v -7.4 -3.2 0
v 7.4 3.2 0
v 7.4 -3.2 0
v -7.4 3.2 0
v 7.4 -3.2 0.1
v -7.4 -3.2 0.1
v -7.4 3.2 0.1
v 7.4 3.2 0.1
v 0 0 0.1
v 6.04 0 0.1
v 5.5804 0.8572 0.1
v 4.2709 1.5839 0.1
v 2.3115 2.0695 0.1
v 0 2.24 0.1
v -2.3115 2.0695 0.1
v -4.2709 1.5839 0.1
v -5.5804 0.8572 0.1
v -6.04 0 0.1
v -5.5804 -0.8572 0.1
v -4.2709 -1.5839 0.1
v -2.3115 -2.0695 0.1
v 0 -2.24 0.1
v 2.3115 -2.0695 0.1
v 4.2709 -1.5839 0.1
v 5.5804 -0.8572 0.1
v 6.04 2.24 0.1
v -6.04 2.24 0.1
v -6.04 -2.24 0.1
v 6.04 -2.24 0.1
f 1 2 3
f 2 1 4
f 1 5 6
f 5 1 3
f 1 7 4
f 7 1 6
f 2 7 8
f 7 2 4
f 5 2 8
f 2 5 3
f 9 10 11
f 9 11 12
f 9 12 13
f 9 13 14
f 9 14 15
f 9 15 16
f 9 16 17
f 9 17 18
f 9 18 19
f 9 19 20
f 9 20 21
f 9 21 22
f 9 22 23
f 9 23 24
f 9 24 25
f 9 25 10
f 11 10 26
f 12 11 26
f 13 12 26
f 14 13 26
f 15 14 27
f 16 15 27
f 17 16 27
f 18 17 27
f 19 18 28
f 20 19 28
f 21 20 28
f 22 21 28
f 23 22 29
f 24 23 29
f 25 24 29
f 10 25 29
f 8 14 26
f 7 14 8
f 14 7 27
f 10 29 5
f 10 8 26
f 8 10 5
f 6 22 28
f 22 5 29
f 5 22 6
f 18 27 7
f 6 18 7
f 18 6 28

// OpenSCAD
// file: ../p/box5-12.scad
use <../lib.scad>
function ldraw_lib__box5_12() = [
// 0 Box with 5 Faces without Any Edges
// 0 Name: box5-12.dat
// 0 Author: Chris Dee [cwdee]
// 0 !LDRAW_ORG Primitive UPDATE 2009-02
// 0 !LICENSE Licensed under CC BY 2.0 and CC BY 4.0 : see CAreadme.txt
// 
// 0 BFC CERTIFY CCW
  [0,"BFC","CERTIFY"],
  [0,"BFC","CCW"],
// 
// 0 !HISTORY 2009-09-03 [PTadmin] Official Update 2009-02
// 
// 
// 4 16 1 1 1 1 1 -1 -1 1 -1 -1 1 1
  [4,16,1,1,1,1,1,-1,-1,1,-1,-1,1,1],
// 4 16 -1 0 1 1 0 1 1 1 1 -1 1 1
  [4,16,-1,0,1,1,0,1,1,1,1,-1,1,1],
// 4 16 -1 0 -1 -1 0 1 -1 1 1 -1 1 -1
  [4,16,-1,0,-1,-1,0,1,-1,1,1,-1,1,-1],
// 4 16 1 0 -1 -1 0 -1 -1 1 -1 1 1 -1
  [4,16,1,0,-1,-1,0,-1,-1,1,-1,1,1,-1],
// 4 16 1 0 1 1 0 -1 1 1 -1 1 1 1
  [4,16,1,0,1,1,0,-1,1,1,-1,1,1,1],
// 0
];
makepoly(ldraw_lib__box5_12(), line=0.2);
// file: ../p/4-4ndis.scad
use <../lib.scad>
function ldraw_lib__4_4ndis() = [
// 0 Disc Negative 1.0
// 0 Name: 4-4ndis.dat
// 0 Author: James Jessiman
// 0 !LDRAW_ORG Primitive UPDATE 2012-01
// 0 !LICENSE Licensed under CC BY 2.0 and CC BY 4.0 : see CAreadme.txt
// 
// 0 BFC CERTIFY CCW
  [0,"BFC","CERTIFY"],
  [0,"BFC","CCW"],
// 
// 0 !HISTORY 2002-03-23 [sbliss] Added BFC statement; compacted code
// 0 !HISTORY 2002-04-25 [PTadmin] Official Update 2002-02
// 0 !HISTORY 2007-06-24 [PTadmin] Header formatted for Contributor Agreement
// 0 !HISTORY 2008-07-01 [PTadmin] Official Update 2008-01
// 0 !HISTORY 2012-02-16 [Philo] Changed to CCW
// 0 !HISTORY 2012-03-30 [PTadmin] Official Update 2012-01
// 
// 
// 3 16 0.9239 0 0.3827 1 0 0 1 0 1
  [3,16,0.9239,0,0.3827,1,0,0,1,0,1],
// 3 16 0.7071 0 0.7071 0.9239 0 0.3827 1 0 1
  [3,16,0.7071,0,0.7071,0.9239,0,0.3827,1,0,1],
// 3 16 0.3827 0 0.9239 0.7071 0 0.7071 1 0 1
  [3,16,0.3827,0,0.9239,0.7071,0,0.7071,1,0,1],
// 3 16 0 0 1 0.3827 0 0.9239 1 0 1
  [3,16,0,0,1,0.3827,0,0.9239,1,0,1],
// 3 16 -0.3827 0 0.9239 0 0 1 -1 0 1
  [3,16,-0.3827,0,0.9239,0,0,1,-1,0,1],
// 3 16 -0.7071 0 0.7071 -0.3827 0 0.9239 -1 0 1
  [3,16,-0.7071,0,0.7071,-0.3827,0,0.9239,-1,0,1],
// 3 16 -0.9239 0 0.3827 -0.7071 0 0.7071 -1 0 1
  [3,16,-0.9239,0,0.3827,-0.7071,0,0.7071,-1,0,1],
// 3 16 -1 0 0 -0.9239 0 0.3827 -1 0 1
  [3,16,-1,0,0,-0.9239,0,0.3827,-1,0,1],
// 3 16 -0.9239 0 -0.3827 -1 0 0 -1 0 -1
  [3,16,-0.9239,0,-0.3827,-1,0,0,-1,0,-1],
// 3 16 -0.7071 0 -0.7071 -0.9239 0 -0.3827 -1 0 -1
  [3,16,-0.7071,0,-0.7071,-0.9239,0,-0.3827,-1,0,-1],
// 3 16 -0.3827 0 -0.9239 -0.7071 0 -0.7071 -1 0 -1
  [3,16,-0.3827,0,-0.9239,-0.7071,0,-0.7071,-1,0,-1],
// 3 16 0 0 -1 -0.3827 0 -0.9239 -1 0 -1
  [3,16,0,0,-1,-0.3827,0,-0.9239,-1,0,-1],
// 3 16 0.3827 0 -0.9239 0 0 -1 1 0 -1
  [3,16,0.3827,0,-0.9239,0,0,-1,1,0,-1],
// 3 16 0.7071 0 -0.7071 0.3827 0 -0.9239 1 0 -1
  [3,16,0.7071,0,-0.7071,0.3827,0,-0.9239,1,0,-1],
// 3 16 0.9239 0 -0.3827 0.7071 0 -0.7071 1 0 -1
  [3,16,0.9239,0,-0.3827,0.7071,0,-0.7071,1,0,-1],
// 3 16 1 0 0 0.9239 0 -0.3827 1 0 -1
  [3,16,1,0,0,0.9239,0,-0.3827,1,0,-1],
];
makepoly(ldraw_lib__4_4ndis(), line=0.2);
// file: ../p/4-4disc.scad
use <../lib.scad>
function ldraw_lib__4_4disc() = [
// 0 Disc 1.0
// 0 Name: 4-4disc.dat
// 0 Author: James Jessiman
// 0 !LDRAW_ORG Primitive UPDATE 2002-02
// 0 !LICENSE Licensed under CC BY 2.0 and CC BY 4.0 : see CAreadme.txt
// 
// 0 BFC CERTIFY CCW
  [0,"BFC","CERTIFY"],
  [0,"BFC","CCW"],
// 
// 0 !HISTORY 1998-12-15 [PTadmin] Official Update 1998-10
// 0 !HISTORY 2002-03-23 [sbliss] Added BFC statement
// 0 !HISTORY 2002-04-25 [PTadmin] Official Update 2002-02
// 0 !HISTORY 2007-06-24 [PTadmin] Header formatted for Contributor Agreement
// 0 !HISTORY 2008-07-01 [PTadmin] Official Update 2008-01
// 
// 
// 3 16 0 0 0 1 0 0 0.9239 0 0.3827
  [3,16,0,0,0,1,0,0,0.9239,0,0.3827],
// 3 16 0 0 0 0.9239 0 0.3827 0.7071 0 0.7071
  [3,16,0,0,0,0.9239,0,0.3827,0.7071,0,0.7071],
// 3 16 0 0 0 0.7071 0 0.7071 0.3827 0 0.9239
  [3,16,0,0,0,0.7071,0,0.7071,0.3827,0,0.9239],
// 3 16 0 0 0 0.3827 0 0.9239 0 0 1
  [3,16,0,0,0,0.3827,0,0.9239,0,0,1],
// 3 16 0 0 0 0 0 1 -0.3827 0 0.9239
  [3,16,0,0,0,0,0,1,-0.3827,0,0.9239],
// 3 16 0 0 0 -0.3827 0 0.9239 -0.7071 0 0.7071
  [3,16,0,0,0,-0.3827,0,0.9239,-0.7071,0,0.7071],
// 3 16 0 0 0 -0.7071 0 0.7071 -0.9239 0 0.3827
  [3,16,0,0,0,-0.7071,0,0.7071,-0.9239,0,0.3827],
// 3 16 0 0 0 -0.9239 0 0.3827 -1 0 -0
  [3,16,0,0,0,-0.9239,0,0.3827,-1,0,-0],
// 3 16 0 0 0 -1 0 -0 -0.9239 0 -0.3827
  [3,16,0,0,0,-1,0,-0,-0.9239,0,-0.3827],
// 3 16 0 0 0 -0.9239 0 -0.3827 -0.7071 0 -0.7071
  [3,16,0,0,0,-0.9239,0,-0.3827,-0.7071,0,-0.7071],
// 3 16 0 0 0 -0.7071 0 -0.7071 -0.3827 0 -0.9239
  [3,16,0,0,0,-0.7071,0,-0.7071,-0.3827,0,-0.9239],
// 3 16 0 0 0 -0.3827 0 -0.9239 0 0 -1
  [3,16,0,0,0,-0.3827,0,-0.9239,0,0,-1],
// 3 16 0 0 0 0 0 -1 0.3827 0 -0.9239
  [3,16,0,0,0,0,0,-1,0.3827,0,-0.9239],
// 3 16 0 0 0 0.3827 0 -0.9239 0.7071 0 -0.7071
  [3,16,0,0,0,0.3827,0,-0.9239,0.7071,0,-0.7071],
// 3 16 0 0 0 0.7071 0 -0.7071 0.9239 0 -0.3827
  [3,16,0,0,0,0.7071,0,-0.7071,0.9239,0,-0.3827],
// 3 16 0 0 0 0.9239 0 -0.3827 1 0 0
  [3,16,0,0,0,0.9239,0,-0.3827,1,0,0],
// 0
];
makepoly(ldraw_lib__4_4disc(), line=0.2);
// main file
use <../lib.scad>
use <../p/4-4disc.scad>
use <../p/4-4ndis.scad>
use <../p/box5-12.scad>
function ldraw_lib__821420a() = [
// 0 Sticker  0.8 x  1.85 with Black Oval
// 0 Name: 821420a.dat
// 0 Author: Max Martin Richter [MMR1988]
// 0 !LDRAW_ORG Part UPDATE 2013-02
// 0 !LICENSE Licensed under CC BY 2.0 and CC BY 4.0 : see CAreadme.txt
// 
// 0 BFC CERTIFY CCW
  [0,"BFC","CERTIFY"],
  [0,"BFC","CCW"],
// 
// 0 !KEYWORDS basin, set 10002, set 4547, sink
// 
// 0 !HISTORY 2013-12-23 [PTadmin] Official Update 2013-02
// 
// 
// 1 16 0 -0.25 0 18.5 0 0 0 0.25 0 0 0 -8 box5-12.dat
  [1,16,0,-0.25,0,18.5,0,0,0,0.25,0,0,0,-8, ldraw_lib__box5_12()],
// 
// 1 0 0 -0.25 0 15.1 0 0 0 1 0 0 0 5.6 4-4disc.dat
  [1,0,0,-0.25,0,15.1,0,0,0,1,0,0,0,5.6, ldraw_lib__4_4disc()],
// 1 16 0 -0.25 0 15.1 0 0 0 1 0 0 0 5.6 4-4ndis.dat
  [1,16,0,-0.25,0,15.1,0,0,0,1,0,0,0,5.6, ldraw_lib__4_4ndis()],
// 
// 3 16 18.5 -0.25 8 0 -0.25 5.6 15.1 -0.25 5.6
  [3,16,18.5,-0.25,8,0,-0.25,5.6,15.1,-0.25,5.6],
// 4 16 18.5 -0.25 8 -18.5 -0.25 8 -15.1 -0.25 5.6 0 -0.25 5.6
  [4,16,18.5,-0.25,8,-18.5,-0.25,8,-15.1,-0.25,5.6,0,-0.25,5.6],
// 3 16 15.1 -0.25 0 15.1 -0.25 -5.6 18.5 -0.25 -8
  [3,16,15.1,-0.25,0,15.1,-0.25,-5.6,18.5,-0.25,-8],
// 4 16 15.1 -0.25 5.6 15.1 -0.25 0 18.5 -0.25 -8 18.5 -0.25 8
  [4,16,15.1,-0.25,5.6,15.1,-0.25,0,18.5,-0.25,-8,18.5,-0.25,8],
// 3 16 -18.5 -0.25 -8 0 -0.25 -5.6 -15.1 -0.25 -5.6
  [3,16,-18.5,-0.25,-8,0,-0.25,-5.6,-15.1,-0.25,-5.6],
// 4 16 -18.5 -0.25 -8 18.5 -0.25 -8 15.1 -0.25 -5.6 0 -0.25 -5.6
  [4,16,-18.5,-0.25,-8,18.5,-0.25,-8,15.1,-0.25,-5.6,0,-0.25,-5.6],
// 3 16 -15.1 -0.25 0 -15.1 -0.25 5.6 -18.5 -0.25 8
  [3,16,-15.1,-0.25,0,-15.1,-0.25,5.6,-18.5,-0.25,8],
// 4 16 -15.1 -0.25 -5.6 -15.1 -0.25 0 -18.5 -0.25 8 -18.5 -0.25 -8
  [4,16,-15.1,-0.25,-5.6,-15.1,-0.25,0,-18.5,-0.25,8,-18.5,-0.25,-8],
];
makepoly(ldraw_lib__821420a(), line=0.2);
